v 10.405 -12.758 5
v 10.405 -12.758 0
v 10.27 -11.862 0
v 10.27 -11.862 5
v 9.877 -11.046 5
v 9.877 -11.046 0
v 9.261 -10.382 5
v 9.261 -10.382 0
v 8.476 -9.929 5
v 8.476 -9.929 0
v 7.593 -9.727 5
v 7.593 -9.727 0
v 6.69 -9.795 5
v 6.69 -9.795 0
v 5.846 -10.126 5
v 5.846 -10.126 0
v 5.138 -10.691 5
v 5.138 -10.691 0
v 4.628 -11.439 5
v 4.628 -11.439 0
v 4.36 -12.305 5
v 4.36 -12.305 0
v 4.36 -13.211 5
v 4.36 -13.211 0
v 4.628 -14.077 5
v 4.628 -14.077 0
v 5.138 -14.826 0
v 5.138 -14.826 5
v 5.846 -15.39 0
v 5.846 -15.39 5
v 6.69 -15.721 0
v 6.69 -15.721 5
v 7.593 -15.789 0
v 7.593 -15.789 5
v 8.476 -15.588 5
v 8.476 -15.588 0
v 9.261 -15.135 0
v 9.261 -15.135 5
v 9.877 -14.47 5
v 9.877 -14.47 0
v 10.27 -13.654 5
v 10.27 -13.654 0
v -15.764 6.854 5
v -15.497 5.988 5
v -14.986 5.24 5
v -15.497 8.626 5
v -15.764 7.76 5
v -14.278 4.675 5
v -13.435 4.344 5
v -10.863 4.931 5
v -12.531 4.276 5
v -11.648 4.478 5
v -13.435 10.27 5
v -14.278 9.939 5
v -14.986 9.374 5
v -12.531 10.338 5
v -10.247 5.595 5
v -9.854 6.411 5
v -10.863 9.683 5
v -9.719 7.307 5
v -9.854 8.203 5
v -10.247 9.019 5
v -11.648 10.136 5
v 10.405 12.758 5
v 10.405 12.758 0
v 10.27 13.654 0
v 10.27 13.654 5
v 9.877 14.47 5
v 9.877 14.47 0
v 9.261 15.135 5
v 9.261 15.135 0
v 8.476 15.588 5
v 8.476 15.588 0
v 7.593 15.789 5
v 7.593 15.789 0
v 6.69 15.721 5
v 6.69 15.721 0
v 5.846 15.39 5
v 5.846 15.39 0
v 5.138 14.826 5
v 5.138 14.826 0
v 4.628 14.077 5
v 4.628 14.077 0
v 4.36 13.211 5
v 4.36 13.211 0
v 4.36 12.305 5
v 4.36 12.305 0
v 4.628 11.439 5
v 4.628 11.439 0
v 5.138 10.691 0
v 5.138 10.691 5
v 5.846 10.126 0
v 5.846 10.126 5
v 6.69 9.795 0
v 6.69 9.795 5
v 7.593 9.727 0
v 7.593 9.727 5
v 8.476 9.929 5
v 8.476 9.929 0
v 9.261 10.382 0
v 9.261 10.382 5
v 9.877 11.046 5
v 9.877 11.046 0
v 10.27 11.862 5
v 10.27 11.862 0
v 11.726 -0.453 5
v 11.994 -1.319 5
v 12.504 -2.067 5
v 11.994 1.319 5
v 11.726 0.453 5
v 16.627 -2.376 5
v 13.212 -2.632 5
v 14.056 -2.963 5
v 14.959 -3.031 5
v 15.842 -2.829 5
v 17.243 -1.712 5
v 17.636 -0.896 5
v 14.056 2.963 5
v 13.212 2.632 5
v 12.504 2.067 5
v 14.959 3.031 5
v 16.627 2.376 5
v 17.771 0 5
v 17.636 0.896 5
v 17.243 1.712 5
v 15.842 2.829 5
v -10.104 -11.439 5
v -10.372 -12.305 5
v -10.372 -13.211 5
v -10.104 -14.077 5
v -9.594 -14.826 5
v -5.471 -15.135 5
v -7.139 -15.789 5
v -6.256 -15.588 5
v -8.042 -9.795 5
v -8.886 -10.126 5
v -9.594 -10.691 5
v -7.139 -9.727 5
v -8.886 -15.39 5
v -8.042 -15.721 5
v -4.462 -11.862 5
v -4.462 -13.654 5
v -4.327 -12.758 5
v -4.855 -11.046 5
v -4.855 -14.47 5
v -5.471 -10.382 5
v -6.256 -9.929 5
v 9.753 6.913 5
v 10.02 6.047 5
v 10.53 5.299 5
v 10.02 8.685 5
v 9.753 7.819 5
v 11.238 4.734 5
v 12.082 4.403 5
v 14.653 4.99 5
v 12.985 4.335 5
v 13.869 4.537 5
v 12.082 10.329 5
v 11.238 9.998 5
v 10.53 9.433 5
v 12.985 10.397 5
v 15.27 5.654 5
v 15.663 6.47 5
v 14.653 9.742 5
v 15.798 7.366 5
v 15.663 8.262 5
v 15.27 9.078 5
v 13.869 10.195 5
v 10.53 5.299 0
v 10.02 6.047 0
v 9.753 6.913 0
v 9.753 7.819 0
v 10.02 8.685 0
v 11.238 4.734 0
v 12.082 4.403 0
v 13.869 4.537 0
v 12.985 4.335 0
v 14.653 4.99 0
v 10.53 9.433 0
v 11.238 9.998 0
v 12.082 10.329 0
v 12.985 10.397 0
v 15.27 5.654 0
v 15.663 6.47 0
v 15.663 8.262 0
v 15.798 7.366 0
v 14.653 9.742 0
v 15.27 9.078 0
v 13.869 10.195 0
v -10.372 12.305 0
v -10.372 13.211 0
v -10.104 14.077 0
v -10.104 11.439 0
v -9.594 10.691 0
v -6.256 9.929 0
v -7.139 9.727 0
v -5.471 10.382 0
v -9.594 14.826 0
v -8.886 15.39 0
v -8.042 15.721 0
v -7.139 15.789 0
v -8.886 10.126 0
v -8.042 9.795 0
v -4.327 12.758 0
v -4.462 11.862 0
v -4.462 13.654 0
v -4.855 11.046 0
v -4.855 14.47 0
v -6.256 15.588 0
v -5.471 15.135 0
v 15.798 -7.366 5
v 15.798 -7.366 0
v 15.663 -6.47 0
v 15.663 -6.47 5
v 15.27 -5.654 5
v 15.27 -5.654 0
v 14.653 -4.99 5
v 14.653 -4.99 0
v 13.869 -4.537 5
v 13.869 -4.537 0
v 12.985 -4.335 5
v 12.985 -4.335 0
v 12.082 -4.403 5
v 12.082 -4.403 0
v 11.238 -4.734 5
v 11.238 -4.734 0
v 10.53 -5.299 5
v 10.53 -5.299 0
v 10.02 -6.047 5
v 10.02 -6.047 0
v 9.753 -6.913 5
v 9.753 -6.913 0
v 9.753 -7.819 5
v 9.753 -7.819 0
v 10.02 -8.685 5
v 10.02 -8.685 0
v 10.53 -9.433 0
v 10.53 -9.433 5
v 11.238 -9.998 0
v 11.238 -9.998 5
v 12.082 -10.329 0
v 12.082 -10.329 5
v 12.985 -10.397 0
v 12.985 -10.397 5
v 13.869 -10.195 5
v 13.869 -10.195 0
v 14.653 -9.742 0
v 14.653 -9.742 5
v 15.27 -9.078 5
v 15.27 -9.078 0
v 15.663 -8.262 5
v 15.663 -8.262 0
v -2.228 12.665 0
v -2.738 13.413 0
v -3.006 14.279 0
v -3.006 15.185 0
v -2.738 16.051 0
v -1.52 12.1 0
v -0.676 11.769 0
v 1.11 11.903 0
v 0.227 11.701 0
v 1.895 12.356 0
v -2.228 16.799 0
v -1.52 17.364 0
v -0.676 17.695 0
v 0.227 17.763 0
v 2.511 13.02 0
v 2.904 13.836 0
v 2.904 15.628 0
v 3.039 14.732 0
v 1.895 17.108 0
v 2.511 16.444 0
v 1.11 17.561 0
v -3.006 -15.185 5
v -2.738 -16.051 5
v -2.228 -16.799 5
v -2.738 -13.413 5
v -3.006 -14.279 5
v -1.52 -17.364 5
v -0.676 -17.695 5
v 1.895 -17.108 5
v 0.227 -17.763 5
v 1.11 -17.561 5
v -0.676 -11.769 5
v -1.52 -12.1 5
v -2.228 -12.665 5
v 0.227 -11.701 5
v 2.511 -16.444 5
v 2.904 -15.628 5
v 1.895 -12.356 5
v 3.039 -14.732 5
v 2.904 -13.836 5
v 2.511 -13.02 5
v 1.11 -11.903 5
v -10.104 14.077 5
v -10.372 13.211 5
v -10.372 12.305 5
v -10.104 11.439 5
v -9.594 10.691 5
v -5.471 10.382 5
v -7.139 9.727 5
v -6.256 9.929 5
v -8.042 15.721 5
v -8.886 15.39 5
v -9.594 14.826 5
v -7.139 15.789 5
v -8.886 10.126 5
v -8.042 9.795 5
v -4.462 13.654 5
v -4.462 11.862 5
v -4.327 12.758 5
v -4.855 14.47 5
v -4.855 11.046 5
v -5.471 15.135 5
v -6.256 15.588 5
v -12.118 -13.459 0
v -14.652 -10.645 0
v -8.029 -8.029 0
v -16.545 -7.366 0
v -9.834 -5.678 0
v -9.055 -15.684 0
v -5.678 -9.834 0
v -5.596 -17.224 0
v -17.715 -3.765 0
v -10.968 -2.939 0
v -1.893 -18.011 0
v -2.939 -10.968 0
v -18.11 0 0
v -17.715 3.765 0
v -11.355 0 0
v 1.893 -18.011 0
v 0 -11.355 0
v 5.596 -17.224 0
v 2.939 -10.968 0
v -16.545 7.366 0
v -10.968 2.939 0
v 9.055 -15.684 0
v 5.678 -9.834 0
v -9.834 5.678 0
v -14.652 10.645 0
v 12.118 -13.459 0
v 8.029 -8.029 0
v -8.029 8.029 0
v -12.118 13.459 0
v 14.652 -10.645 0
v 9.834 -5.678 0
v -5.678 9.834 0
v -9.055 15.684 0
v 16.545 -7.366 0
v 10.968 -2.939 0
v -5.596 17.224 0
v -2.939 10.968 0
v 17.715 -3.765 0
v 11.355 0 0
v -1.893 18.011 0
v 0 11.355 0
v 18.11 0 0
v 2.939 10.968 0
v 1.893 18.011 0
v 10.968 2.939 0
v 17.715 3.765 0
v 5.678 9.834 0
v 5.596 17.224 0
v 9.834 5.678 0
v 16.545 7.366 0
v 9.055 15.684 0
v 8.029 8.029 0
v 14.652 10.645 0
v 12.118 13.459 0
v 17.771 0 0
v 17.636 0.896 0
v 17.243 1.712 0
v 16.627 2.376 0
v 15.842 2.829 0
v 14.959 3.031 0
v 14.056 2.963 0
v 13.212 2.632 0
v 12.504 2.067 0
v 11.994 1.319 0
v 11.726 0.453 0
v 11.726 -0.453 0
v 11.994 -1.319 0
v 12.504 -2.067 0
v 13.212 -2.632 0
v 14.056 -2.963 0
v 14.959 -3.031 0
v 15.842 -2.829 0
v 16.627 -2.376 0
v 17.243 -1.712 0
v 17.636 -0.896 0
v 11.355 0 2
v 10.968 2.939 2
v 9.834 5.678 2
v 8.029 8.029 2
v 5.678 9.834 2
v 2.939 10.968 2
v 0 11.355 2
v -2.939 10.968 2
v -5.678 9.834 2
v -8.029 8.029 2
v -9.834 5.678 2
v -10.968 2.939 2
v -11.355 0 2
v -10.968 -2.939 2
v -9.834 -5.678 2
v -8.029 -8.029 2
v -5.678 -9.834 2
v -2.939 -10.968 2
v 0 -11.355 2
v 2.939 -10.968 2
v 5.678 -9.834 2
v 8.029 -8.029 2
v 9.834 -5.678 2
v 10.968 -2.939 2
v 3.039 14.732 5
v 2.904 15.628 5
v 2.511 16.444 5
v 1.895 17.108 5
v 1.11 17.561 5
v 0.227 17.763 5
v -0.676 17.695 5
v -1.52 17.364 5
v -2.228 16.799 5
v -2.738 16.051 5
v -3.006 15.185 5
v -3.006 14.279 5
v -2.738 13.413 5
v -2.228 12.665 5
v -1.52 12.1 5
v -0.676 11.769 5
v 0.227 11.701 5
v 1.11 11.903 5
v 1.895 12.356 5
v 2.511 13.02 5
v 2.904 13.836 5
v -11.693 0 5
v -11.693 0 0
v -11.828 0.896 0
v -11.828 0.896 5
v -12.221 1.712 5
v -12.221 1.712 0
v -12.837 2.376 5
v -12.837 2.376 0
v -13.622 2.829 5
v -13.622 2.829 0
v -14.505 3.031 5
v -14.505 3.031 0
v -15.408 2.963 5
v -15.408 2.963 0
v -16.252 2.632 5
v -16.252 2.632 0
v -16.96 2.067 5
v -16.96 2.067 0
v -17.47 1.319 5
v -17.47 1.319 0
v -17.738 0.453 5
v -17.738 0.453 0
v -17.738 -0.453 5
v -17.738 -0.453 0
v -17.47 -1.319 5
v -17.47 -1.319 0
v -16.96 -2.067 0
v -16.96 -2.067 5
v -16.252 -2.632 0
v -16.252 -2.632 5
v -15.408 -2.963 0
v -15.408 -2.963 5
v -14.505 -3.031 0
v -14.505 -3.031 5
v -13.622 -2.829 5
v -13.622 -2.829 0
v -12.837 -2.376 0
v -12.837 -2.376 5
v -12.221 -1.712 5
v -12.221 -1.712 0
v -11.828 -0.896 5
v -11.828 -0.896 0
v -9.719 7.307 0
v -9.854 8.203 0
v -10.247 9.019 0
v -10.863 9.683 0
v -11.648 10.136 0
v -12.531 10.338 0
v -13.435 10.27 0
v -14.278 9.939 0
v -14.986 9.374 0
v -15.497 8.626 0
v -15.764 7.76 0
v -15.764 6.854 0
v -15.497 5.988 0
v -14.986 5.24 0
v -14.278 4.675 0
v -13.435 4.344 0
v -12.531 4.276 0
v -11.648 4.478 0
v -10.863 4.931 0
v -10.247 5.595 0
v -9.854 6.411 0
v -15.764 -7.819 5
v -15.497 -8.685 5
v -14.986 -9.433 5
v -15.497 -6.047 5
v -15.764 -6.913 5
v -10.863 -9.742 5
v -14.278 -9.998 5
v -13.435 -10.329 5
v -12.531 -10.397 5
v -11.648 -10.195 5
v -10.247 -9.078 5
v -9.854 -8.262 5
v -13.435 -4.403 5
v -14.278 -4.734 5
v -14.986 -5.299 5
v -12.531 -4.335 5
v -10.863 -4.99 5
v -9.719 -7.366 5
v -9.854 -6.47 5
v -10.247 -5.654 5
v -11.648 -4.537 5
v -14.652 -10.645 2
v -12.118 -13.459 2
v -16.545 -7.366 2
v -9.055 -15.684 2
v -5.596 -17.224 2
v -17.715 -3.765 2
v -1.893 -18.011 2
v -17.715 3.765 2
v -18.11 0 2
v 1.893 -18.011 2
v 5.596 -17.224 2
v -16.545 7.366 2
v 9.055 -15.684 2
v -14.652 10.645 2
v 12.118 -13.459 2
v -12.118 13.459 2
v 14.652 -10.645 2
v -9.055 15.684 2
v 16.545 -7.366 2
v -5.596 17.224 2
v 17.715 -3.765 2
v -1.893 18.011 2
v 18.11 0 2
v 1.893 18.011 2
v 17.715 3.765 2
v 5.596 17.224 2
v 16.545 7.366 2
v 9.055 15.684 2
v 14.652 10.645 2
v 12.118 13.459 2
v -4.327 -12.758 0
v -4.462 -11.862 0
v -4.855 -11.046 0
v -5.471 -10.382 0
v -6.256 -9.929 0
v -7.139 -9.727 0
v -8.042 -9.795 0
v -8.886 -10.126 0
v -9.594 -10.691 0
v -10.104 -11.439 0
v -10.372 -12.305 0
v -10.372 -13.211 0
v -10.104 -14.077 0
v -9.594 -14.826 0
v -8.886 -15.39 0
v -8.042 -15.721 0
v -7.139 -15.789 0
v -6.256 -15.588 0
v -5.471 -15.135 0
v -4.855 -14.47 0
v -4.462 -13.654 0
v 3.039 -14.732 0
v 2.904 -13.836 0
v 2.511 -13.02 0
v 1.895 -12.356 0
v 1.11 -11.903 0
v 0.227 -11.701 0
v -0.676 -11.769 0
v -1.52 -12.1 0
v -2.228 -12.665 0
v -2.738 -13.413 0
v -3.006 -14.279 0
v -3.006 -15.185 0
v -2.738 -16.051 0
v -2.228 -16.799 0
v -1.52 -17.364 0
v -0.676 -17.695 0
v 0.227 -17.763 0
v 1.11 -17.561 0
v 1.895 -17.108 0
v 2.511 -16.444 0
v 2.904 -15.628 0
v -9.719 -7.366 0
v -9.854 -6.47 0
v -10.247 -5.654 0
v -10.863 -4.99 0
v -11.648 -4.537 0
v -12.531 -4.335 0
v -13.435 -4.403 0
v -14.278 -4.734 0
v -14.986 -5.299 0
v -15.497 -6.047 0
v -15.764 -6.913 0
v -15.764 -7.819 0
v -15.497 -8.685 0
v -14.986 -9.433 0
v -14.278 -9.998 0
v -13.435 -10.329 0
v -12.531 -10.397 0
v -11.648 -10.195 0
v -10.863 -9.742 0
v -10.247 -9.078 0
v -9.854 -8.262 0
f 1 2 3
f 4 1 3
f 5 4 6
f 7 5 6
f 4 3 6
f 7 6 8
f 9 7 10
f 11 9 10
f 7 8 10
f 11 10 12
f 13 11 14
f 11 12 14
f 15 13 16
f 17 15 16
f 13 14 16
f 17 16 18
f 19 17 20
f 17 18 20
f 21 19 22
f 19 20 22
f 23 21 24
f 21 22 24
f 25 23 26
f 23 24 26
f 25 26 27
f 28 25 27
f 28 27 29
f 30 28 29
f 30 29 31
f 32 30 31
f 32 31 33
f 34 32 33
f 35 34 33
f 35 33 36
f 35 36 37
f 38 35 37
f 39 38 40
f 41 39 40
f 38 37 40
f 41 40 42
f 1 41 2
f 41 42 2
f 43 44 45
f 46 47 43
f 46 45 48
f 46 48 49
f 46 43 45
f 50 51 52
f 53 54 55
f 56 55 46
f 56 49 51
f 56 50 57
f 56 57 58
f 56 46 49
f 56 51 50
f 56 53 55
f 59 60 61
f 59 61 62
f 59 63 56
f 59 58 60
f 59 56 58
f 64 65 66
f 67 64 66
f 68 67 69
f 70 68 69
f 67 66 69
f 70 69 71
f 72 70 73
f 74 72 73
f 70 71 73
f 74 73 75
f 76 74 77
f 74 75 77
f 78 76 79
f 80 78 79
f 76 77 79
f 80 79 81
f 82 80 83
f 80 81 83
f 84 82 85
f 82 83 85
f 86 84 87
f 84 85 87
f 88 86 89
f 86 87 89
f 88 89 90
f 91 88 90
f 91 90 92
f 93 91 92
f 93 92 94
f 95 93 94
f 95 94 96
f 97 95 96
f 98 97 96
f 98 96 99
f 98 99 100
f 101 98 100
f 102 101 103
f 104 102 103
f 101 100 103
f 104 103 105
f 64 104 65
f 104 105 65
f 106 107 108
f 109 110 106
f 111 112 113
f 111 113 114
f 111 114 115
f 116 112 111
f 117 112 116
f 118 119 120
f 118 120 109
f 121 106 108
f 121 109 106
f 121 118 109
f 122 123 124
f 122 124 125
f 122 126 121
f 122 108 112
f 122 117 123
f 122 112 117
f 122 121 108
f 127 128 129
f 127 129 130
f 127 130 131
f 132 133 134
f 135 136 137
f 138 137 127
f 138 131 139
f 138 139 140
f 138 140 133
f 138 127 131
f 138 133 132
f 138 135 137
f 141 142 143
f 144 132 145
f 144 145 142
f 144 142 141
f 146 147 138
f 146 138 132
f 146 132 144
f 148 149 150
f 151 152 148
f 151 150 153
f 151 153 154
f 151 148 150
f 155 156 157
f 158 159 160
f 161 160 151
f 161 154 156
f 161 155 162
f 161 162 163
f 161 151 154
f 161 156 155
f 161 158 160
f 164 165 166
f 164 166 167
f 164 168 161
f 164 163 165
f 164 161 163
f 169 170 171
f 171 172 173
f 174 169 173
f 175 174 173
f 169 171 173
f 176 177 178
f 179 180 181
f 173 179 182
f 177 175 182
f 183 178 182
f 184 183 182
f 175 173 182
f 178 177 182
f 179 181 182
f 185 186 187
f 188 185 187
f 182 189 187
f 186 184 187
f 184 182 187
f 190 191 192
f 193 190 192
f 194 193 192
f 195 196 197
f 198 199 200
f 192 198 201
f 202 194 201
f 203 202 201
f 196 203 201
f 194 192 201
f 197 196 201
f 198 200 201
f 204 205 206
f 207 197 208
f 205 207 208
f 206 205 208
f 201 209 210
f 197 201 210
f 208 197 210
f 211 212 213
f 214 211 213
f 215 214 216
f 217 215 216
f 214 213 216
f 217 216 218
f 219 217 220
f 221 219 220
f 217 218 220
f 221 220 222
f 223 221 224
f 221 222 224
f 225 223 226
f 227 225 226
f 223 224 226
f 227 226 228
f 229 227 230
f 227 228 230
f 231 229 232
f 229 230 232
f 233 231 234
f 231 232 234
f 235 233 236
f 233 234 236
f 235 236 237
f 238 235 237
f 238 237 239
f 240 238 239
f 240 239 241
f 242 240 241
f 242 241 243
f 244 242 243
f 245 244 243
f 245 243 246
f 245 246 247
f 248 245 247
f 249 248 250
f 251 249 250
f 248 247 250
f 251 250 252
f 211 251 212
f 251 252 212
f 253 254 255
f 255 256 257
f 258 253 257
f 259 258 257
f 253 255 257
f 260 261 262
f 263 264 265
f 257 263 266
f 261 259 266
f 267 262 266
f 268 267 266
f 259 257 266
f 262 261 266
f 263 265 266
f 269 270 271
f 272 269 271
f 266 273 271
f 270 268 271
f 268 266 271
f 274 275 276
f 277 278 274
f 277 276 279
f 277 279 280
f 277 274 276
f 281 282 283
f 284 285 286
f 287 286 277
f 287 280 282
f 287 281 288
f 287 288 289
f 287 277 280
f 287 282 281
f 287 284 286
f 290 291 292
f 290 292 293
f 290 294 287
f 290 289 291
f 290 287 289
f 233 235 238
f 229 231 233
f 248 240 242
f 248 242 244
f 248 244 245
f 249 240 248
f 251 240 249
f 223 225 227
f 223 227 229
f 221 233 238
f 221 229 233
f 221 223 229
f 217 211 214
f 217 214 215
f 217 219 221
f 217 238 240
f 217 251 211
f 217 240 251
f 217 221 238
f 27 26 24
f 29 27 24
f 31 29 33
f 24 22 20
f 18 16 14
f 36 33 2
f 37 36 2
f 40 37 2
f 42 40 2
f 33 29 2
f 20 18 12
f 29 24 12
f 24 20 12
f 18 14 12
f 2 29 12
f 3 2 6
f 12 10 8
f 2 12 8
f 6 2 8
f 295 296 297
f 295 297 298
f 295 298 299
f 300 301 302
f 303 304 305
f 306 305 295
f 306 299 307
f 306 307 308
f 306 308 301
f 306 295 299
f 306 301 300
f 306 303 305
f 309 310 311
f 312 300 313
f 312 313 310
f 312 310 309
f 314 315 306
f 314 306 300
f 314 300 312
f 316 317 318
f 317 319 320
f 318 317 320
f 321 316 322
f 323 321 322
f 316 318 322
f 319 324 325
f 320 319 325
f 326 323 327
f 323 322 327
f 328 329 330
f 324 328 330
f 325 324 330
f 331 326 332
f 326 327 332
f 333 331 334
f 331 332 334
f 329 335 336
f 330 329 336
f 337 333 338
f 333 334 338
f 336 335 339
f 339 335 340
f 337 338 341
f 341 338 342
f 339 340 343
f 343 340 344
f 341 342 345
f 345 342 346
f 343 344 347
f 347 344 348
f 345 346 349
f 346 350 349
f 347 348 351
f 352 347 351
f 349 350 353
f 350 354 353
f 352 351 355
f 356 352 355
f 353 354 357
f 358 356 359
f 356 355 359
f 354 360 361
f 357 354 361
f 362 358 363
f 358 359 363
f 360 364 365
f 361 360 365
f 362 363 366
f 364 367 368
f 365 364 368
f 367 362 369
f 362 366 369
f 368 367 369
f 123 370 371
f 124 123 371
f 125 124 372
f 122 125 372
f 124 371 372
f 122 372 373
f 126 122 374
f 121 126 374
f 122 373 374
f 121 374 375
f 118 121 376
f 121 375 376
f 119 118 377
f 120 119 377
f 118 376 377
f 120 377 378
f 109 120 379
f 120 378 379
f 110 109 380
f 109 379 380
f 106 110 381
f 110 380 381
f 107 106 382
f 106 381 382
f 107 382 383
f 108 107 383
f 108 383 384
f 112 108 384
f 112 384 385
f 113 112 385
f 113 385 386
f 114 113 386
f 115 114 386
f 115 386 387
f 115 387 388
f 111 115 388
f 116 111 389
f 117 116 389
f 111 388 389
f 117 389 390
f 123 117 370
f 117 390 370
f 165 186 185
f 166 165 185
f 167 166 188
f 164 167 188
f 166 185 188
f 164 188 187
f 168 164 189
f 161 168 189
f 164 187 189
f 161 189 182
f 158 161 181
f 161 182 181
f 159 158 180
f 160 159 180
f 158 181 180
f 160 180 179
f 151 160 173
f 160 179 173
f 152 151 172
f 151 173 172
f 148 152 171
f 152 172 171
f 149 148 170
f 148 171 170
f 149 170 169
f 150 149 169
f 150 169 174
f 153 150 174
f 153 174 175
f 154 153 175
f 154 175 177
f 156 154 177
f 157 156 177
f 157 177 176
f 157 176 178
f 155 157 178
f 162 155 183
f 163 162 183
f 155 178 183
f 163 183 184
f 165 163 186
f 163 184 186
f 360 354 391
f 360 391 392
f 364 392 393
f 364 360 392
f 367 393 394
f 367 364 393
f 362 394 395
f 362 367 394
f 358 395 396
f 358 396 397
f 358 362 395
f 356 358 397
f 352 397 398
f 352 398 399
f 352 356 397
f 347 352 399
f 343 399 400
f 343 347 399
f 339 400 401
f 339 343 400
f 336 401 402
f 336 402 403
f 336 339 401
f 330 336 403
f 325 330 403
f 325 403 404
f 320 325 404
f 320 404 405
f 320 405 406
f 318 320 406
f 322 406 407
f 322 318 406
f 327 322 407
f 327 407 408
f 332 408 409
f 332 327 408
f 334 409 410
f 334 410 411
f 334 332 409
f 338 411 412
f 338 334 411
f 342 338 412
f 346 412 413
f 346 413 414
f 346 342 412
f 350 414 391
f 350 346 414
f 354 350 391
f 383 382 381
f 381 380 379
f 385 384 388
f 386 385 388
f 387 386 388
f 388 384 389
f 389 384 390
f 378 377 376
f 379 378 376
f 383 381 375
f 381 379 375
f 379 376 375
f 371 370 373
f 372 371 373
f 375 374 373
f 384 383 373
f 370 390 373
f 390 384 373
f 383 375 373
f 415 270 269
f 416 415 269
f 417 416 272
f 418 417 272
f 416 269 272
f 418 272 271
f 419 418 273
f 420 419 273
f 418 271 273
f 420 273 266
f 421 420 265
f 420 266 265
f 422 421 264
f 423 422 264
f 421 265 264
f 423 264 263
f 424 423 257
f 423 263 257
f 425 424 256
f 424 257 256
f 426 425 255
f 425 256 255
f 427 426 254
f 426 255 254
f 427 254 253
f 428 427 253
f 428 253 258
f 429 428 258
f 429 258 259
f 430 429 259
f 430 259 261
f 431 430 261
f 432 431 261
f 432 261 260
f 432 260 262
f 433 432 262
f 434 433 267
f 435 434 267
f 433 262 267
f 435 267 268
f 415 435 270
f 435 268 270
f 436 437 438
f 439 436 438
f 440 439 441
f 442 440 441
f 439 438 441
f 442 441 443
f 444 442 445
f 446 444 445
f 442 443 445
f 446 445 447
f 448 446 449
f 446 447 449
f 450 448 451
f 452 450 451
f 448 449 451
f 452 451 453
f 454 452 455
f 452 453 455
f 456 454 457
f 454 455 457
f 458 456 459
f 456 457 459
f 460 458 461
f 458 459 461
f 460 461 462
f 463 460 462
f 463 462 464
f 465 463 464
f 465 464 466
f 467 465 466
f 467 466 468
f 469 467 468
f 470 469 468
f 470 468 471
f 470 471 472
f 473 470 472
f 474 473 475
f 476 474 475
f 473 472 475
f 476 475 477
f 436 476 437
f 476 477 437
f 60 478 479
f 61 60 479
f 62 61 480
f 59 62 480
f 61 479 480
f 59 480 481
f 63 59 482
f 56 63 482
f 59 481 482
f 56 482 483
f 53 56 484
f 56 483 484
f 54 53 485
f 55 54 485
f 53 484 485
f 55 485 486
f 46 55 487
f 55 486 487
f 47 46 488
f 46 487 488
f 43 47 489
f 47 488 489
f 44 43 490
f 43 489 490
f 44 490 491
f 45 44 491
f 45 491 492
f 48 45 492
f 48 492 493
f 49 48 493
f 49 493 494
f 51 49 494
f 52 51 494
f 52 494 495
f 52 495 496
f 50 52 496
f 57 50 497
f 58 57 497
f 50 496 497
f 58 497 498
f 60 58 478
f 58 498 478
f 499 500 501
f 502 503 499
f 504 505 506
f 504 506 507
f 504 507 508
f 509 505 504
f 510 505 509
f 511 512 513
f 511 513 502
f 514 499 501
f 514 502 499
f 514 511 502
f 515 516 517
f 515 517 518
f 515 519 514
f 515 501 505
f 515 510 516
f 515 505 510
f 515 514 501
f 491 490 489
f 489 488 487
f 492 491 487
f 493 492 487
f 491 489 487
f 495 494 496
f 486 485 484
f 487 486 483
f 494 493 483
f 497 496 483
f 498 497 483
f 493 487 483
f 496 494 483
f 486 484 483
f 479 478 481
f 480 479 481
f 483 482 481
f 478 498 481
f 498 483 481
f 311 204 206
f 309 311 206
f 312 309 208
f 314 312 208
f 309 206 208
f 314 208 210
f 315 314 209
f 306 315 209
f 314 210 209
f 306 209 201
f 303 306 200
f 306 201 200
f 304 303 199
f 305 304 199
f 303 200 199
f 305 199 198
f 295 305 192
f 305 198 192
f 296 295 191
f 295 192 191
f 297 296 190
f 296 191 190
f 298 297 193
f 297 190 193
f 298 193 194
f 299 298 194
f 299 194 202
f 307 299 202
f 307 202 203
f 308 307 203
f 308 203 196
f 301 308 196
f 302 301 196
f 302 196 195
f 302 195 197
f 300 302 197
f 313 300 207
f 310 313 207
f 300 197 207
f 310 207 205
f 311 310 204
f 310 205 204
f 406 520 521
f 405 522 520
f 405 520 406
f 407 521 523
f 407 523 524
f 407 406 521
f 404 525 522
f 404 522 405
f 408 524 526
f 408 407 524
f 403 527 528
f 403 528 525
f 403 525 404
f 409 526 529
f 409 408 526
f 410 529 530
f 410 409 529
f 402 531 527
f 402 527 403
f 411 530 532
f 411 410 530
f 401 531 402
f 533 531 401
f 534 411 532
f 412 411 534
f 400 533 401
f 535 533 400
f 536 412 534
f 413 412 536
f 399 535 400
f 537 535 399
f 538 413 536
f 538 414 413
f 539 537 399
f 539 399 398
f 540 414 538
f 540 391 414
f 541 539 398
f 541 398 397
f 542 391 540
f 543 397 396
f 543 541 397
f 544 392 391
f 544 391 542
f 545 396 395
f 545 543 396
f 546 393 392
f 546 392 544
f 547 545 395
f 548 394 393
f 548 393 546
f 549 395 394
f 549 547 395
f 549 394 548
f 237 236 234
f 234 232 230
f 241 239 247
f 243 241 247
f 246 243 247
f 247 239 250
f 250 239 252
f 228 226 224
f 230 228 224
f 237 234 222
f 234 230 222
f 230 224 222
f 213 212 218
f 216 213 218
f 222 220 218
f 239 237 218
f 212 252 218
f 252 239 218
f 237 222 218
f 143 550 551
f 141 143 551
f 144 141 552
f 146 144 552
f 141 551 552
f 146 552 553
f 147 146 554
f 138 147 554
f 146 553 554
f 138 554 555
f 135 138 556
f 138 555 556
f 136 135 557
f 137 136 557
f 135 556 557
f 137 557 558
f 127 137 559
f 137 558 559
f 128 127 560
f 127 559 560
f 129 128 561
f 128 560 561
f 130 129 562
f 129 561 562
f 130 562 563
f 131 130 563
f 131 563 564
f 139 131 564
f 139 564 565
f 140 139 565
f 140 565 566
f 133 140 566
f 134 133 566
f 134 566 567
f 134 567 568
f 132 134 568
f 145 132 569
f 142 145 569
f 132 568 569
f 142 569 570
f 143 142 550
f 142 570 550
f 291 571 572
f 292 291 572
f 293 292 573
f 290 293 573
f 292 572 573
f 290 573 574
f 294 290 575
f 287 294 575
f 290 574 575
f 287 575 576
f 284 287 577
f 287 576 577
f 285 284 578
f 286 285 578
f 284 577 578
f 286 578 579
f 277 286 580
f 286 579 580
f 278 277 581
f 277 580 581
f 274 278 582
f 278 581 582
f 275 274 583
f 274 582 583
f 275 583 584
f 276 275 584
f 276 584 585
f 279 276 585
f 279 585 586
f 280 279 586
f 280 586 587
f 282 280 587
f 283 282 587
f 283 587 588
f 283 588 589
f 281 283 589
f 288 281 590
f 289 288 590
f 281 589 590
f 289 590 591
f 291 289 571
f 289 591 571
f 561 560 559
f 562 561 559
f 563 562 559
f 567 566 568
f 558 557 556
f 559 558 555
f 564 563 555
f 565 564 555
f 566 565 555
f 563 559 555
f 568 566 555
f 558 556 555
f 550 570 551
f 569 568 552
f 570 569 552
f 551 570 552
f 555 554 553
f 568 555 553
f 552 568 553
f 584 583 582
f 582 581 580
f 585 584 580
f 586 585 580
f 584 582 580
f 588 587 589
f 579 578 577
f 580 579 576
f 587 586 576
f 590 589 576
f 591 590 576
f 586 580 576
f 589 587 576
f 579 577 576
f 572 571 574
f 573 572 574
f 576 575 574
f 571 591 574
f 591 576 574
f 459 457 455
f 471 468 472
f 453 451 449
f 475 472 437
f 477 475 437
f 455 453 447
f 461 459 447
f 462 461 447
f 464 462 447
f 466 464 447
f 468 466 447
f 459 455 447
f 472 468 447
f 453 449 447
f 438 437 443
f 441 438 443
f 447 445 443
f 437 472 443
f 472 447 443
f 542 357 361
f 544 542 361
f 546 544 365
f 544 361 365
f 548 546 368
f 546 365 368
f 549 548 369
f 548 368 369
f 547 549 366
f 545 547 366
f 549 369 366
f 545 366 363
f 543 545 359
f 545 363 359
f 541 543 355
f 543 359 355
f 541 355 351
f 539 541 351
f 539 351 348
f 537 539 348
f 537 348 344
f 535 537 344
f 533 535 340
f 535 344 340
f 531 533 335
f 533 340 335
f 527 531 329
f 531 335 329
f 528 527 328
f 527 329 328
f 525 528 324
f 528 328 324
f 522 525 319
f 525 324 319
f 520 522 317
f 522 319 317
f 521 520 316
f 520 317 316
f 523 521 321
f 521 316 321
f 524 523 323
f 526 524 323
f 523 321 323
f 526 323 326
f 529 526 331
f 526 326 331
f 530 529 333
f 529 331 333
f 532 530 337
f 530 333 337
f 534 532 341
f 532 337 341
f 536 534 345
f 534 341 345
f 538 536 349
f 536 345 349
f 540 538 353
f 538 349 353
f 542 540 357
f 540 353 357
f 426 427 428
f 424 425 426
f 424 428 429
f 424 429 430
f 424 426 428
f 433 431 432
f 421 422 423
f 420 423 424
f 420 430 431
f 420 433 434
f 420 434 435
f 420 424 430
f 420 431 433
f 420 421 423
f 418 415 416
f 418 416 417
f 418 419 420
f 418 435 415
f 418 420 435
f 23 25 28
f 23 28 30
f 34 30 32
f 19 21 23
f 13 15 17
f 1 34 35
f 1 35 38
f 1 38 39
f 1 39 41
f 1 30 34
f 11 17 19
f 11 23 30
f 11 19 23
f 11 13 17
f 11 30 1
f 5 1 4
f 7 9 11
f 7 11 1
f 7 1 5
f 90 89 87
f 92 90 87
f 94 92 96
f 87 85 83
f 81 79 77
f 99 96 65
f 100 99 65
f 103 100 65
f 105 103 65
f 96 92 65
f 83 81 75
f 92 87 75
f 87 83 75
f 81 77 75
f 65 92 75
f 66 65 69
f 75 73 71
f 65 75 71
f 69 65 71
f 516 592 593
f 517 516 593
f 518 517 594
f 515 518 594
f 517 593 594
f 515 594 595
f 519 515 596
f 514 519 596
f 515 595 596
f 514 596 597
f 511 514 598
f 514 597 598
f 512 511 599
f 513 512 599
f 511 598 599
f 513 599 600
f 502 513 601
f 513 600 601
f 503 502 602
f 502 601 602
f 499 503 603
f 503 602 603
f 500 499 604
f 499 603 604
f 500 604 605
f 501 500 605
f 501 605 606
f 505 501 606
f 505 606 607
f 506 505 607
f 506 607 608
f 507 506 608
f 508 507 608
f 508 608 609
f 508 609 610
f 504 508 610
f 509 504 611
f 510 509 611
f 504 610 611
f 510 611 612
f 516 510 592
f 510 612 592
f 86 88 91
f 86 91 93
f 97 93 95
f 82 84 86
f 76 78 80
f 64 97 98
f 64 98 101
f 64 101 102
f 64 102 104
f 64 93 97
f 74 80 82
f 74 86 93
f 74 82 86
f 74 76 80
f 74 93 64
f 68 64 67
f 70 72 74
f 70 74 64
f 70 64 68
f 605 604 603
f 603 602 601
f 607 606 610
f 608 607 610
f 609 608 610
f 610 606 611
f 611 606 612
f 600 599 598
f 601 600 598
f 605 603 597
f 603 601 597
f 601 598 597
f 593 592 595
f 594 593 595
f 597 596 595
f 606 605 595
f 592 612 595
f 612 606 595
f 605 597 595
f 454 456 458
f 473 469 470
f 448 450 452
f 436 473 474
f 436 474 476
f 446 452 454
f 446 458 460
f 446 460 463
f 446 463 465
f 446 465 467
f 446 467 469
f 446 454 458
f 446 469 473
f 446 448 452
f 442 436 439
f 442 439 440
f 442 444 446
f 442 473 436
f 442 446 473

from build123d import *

# Parameters (mm, degrees)
F0_R     = 18.110450128
F0_R_2   = 3.0394543154
F0_R_3   = 11.3553291666
F1_DEPTH = 2
F2_DEPTH = 5


with BuildPart() as f1:
    # F0 (on Top) → F1 (new body)
    with BuildSketch(Plane.XY):
        Circle(F0_R)
        with Locations((-7.366, -12.7582)):
            Circle(F0_R_2, mode=Mode.SUBTRACT)
        with Locations((-12.7582, -7.366)):
            Circle(F0_R_2, mode=Mode.SUBTRACT)
        with Locations((0, -14.732)):
            Circle(F0_R_2, mode=Mode.SUBTRACT)
        with Locations((7.366, -12.7582)):
            Circle(F0_R_2, mode=Mode.SUBTRACT)
        with Locations((12.7582, -7.366)):
            Circle(F0_R_2, mode=Mode.SUBTRACT)
        with Locations((-14.732, 0)):
            Circle(F0_R_2, mode=Mode.SUBTRACT)
        with Locations((-12.7582, 7.3070060462)):
            Circle(F0_R_2, mode=Mode.SUBTRACT)
        with Locations((-7.366, 12.7582)):
            Circle(F0_R_2, mode=Mode.SUBTRACT)
        Circle(F0_R_3, mode=Mode.SUBTRACT)
        with Locations((14.732, 0)):
            Circle(F0_R_2, mode=Mode.SUBTRACT)
        with Locations((12.7582, 7.366)):
            Circle(F0_R_2, mode=Mode.SUBTRACT)
        with Locations((7.366, 12.7582)):
            Circle(F0_R_2, mode=Mode.SUBTRACT)
        with Locations((0, 14.732)):
            Circle(F0_R_2, mode=Mode.SUBTRACT)
        with Locations((-12.7582, 7.3070060462)):
            Circle(F0_R_2)
        with Locations((-7.366, 12.7582)):
            Circle(F0_R_2)
        with Locations((0, 14.732)):
            Circle(F0_R_2)
        with Locations((7.366, 12.7582)):
            Circle(F0_R_2)
        with Locations((12.7582, 7.366)):
            Circle(F0_R_2)
        with Locations((14.732, 0)):
            Circle(F0_R_2)
        with Locations((12.7582, -7.366)):
            Circle(F0_R_2)
        with Locations((7.366, -12.7582)):
            Circle(F0_R_2)
        with Locations((0, -14.732)):
            Circle(F0_R_2)
        with Locations((-7.366, -12.7582)):
            Circle(F0_R_2)
        with Locations((-12.7582, -7.366)):
            Circle(F0_R_2)
        with Locations((-14.732, 0)):
            Circle(F0_R_2)
    extrude(amount=F1_DEPTH)


with BuildPart() as f2:
    # F0 (on Top) → F2 (new body)
    with BuildSketch(Plane.XY):
        with Locations((-7.366, 12.7582)):
            Circle(F0_R_2)
    extrude(amount=F2_DEPTH)


with BuildPart() as f2b:
    # F0 (on Top) → F2, piece 2 (new body)
    with BuildSketch(Plane.XY):
        with Locations((0, 14.732)):
            Circle(F0_R_2)
    extrude(amount=F2_DEPTH)


with BuildPart() as f2c:
    # F0 (on Top) → F2, piece 3 (new body)
    with BuildSketch(Plane.XY):
        with Locations((7.366, 12.7582)):
            Circle(F0_R_2)
    extrude(amount=F2_DEPTH)


with BuildPart() as f2d:
    # F0 (on Top) → F2, piece 4 (new body)
    with BuildSketch(Plane.XY):
        with Locations((12.7582, 7.366)):
            Circle(F0_R_2)
    extrude(amount=F2_DEPTH)


with BuildPart() as f2e:
    # F0 (on Top) → F2, piece 5 (new body)
    with BuildSketch(Plane.XY):
        with Locations((14.732, 0)):
            Circle(F0_R_2)
    extrude(amount=F2_DEPTH)


with BuildPart() as f2f:
    # F0 (on Top) → F2, piece 6 (new body)
    with BuildSketch(Plane.XY):
        with Locations((12.7582, -7.366)):
            Circle(F0_R_2)
    extrude(amount=F2_DEPTH)


with BuildPart() as f2g:
    # F0 (on Top) → F2, piece 7 (new body)
    with BuildSketch(Plane.XY):
        with Locations((7.366, -12.7582)):
            Circle(F0_R_2)
    extrude(amount=F2_DEPTH)


with BuildPart() as f2h:
    # F0 (on Top) → F2, piece 8 (new body)
    with BuildSketch(Plane.XY):
        with Locations((0, -14.732)):
            Circle(F0_R_2)
    extrude(amount=F2_DEPTH)


with BuildPart() as f2i:
    # F0 (on Top) → F2, piece 9 (new body)
    with BuildSketch(Plane.XY):
        with Locations((-7.366, -12.7582)):
            Circle(F0_R_2)
    extrude(amount=F2_DEPTH)


with BuildPart() as f2j:
    # F0 (on Top) → F2, piece 10 (new body)
    with BuildSketch(Plane.XY):
        with Locations((-12.7582, -7.366)):
            Circle(F0_R_2)
    extrude(amount=F2_DEPTH)


with BuildPart() as f2k:
    # F0 (on Top) → F2, piece 11 (new body)
    with BuildSketch(Plane.XY):
        with Locations((-14.732, 0)):
            Circle(F0_R_2)
    extrude(amount=F2_DEPTH)


with BuildPart() as f2l:
    # F0 (on Top) → F2, piece 12 (new body)
    with BuildSketch(Plane.XY):
        with Locations((-12.7582, 7.3070060462)):
            Circle(F0_R_2)
    extrude(amount=F2_DEPTH)


solid = Compound([f1.part, f2.part, f2b.part, f2c.part, f2d.part, f2e.part, f2f.part, f2g.part, f2h.part, f2i.part, f2j.part, f2k.part, f2l.part])
